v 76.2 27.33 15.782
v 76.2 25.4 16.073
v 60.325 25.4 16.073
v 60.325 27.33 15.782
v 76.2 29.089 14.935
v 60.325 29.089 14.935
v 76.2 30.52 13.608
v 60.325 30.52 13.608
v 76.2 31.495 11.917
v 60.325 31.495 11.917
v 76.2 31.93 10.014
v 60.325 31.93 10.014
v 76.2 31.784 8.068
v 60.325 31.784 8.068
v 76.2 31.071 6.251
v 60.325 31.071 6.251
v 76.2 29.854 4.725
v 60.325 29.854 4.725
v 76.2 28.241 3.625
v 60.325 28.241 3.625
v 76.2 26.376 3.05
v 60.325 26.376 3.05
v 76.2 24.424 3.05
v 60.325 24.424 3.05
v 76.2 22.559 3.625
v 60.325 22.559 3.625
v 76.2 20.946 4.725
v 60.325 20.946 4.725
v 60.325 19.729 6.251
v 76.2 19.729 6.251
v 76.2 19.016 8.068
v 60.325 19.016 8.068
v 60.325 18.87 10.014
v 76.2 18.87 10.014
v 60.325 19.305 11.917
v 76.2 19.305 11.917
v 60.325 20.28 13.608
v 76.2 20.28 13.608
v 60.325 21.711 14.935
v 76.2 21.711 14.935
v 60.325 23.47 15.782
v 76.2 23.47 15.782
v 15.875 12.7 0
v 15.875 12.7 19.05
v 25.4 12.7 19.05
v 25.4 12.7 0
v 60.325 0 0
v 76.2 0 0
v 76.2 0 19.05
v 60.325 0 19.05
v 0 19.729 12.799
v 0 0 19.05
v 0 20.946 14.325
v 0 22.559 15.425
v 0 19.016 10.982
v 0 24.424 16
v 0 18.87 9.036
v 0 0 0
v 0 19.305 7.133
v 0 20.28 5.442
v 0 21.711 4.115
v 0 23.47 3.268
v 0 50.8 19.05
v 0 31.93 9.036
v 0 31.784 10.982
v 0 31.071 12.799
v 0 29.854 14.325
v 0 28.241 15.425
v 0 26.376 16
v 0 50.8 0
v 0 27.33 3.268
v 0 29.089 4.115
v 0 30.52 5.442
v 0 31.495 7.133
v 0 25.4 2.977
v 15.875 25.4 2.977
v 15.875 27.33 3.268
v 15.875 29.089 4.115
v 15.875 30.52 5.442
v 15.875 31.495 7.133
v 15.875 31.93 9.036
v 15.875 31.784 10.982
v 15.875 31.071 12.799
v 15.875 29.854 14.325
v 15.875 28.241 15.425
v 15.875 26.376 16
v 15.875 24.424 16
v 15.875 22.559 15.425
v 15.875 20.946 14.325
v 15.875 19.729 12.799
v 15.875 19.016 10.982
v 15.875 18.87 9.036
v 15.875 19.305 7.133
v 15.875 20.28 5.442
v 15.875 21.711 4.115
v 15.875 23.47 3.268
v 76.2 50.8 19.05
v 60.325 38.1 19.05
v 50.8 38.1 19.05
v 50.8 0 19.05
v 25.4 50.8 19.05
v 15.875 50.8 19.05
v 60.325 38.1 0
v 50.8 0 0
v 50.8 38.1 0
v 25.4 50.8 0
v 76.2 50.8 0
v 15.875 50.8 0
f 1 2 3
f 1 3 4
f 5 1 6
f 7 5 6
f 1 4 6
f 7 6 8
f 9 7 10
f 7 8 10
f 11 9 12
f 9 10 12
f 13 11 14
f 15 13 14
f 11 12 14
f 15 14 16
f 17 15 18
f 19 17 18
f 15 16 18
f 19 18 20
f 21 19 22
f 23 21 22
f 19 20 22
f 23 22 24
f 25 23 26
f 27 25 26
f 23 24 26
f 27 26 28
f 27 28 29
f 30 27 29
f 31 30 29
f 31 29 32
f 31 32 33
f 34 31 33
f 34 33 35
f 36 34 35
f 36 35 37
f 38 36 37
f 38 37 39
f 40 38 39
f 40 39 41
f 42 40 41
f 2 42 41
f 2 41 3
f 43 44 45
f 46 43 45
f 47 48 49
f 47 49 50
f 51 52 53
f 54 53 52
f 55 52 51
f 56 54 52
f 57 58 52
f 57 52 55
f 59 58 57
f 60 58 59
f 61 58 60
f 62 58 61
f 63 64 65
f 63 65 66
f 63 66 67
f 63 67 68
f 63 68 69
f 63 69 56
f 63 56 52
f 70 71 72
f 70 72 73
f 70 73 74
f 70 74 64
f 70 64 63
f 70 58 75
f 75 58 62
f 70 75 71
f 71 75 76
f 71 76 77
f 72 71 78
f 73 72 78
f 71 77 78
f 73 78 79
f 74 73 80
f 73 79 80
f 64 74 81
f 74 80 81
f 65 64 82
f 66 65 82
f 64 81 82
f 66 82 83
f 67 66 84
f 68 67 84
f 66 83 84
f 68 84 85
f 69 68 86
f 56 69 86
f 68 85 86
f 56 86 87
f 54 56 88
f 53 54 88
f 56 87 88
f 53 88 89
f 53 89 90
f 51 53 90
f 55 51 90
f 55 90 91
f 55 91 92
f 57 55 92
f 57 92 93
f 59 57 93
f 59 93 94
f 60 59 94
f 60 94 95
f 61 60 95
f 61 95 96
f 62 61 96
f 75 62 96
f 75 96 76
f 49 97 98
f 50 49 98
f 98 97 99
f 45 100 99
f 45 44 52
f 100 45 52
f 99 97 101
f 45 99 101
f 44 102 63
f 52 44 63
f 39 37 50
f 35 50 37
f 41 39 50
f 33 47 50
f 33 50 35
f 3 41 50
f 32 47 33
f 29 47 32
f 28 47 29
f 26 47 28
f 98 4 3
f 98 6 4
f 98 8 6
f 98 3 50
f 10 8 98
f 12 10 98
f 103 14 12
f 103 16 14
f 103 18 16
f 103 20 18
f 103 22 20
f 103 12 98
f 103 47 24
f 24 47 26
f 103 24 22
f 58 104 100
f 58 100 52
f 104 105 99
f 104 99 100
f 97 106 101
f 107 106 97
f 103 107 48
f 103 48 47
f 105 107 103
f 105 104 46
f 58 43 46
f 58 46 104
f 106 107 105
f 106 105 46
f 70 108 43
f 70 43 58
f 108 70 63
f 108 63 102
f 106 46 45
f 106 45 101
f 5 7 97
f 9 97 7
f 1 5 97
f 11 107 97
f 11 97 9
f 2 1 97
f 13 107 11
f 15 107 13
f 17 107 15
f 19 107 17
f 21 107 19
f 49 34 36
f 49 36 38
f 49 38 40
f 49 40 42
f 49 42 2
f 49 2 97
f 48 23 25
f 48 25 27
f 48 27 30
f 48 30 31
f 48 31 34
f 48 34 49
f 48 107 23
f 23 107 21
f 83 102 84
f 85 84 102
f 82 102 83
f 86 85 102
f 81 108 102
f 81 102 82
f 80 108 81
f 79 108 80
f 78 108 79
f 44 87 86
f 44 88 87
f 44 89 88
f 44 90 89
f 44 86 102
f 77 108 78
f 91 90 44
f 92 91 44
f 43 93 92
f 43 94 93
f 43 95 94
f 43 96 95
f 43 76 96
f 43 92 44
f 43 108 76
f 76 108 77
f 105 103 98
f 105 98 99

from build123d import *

# Parameters (mm, degrees)
BOSS_EXTRUDE1_DEPTH         = 19.05
F_1_2_CLEARANCE_HOLE1_D     = 13.09624
F_1_2_CLEARANCE_HOLE1_DEPTH = 15.875
F_1_2_CLEARANCE_HOLE2_D     = 13.09624
F_1_2_CLEARANCE_HOLE2_DEPTH = 15.875


with BuildPart() as part:
    # Sketch1 → Boss-Extrude1 (new body)
    with BuildSketch(Plane.XY):
        Polygon((0, 0), (0, 50.8), (15.875, 50.8), (15.875, 12.7), (25.4, 12.7), (25.4, 50.8), (76.2, 50.8), (76.2, 0), (60.325, 0), (60.325, 38.1), (50.8, 38.1), (50.8, 0), align=None)
    extrude(amount=BOSS_EXTRUDE1_DEPTH)

    # 1/2 Clearance Hole1
    with Locations(Plane.ZY):
        with Locations((9.525, 25.4)):
            Hole(F_1_2_CLEARANCE_HOLE1_D / 2, depth=F_1_2_CLEARANCE_HOLE1_DEPTH)

    # 1/2 Clearance Hole2
    with Locations(Plane(origin=(76.2, 0, 0), x_dir=(0, 0, -1), z_dir=(1, 0, 0))):
        with Locations((-9.525, 25.4)):
            Hole(F_1_2_CLEARANCE_HOLE2_D / 2, depth=F_1_2_CLEARANCE_HOLE2_DEPTH)


solid = part.part
